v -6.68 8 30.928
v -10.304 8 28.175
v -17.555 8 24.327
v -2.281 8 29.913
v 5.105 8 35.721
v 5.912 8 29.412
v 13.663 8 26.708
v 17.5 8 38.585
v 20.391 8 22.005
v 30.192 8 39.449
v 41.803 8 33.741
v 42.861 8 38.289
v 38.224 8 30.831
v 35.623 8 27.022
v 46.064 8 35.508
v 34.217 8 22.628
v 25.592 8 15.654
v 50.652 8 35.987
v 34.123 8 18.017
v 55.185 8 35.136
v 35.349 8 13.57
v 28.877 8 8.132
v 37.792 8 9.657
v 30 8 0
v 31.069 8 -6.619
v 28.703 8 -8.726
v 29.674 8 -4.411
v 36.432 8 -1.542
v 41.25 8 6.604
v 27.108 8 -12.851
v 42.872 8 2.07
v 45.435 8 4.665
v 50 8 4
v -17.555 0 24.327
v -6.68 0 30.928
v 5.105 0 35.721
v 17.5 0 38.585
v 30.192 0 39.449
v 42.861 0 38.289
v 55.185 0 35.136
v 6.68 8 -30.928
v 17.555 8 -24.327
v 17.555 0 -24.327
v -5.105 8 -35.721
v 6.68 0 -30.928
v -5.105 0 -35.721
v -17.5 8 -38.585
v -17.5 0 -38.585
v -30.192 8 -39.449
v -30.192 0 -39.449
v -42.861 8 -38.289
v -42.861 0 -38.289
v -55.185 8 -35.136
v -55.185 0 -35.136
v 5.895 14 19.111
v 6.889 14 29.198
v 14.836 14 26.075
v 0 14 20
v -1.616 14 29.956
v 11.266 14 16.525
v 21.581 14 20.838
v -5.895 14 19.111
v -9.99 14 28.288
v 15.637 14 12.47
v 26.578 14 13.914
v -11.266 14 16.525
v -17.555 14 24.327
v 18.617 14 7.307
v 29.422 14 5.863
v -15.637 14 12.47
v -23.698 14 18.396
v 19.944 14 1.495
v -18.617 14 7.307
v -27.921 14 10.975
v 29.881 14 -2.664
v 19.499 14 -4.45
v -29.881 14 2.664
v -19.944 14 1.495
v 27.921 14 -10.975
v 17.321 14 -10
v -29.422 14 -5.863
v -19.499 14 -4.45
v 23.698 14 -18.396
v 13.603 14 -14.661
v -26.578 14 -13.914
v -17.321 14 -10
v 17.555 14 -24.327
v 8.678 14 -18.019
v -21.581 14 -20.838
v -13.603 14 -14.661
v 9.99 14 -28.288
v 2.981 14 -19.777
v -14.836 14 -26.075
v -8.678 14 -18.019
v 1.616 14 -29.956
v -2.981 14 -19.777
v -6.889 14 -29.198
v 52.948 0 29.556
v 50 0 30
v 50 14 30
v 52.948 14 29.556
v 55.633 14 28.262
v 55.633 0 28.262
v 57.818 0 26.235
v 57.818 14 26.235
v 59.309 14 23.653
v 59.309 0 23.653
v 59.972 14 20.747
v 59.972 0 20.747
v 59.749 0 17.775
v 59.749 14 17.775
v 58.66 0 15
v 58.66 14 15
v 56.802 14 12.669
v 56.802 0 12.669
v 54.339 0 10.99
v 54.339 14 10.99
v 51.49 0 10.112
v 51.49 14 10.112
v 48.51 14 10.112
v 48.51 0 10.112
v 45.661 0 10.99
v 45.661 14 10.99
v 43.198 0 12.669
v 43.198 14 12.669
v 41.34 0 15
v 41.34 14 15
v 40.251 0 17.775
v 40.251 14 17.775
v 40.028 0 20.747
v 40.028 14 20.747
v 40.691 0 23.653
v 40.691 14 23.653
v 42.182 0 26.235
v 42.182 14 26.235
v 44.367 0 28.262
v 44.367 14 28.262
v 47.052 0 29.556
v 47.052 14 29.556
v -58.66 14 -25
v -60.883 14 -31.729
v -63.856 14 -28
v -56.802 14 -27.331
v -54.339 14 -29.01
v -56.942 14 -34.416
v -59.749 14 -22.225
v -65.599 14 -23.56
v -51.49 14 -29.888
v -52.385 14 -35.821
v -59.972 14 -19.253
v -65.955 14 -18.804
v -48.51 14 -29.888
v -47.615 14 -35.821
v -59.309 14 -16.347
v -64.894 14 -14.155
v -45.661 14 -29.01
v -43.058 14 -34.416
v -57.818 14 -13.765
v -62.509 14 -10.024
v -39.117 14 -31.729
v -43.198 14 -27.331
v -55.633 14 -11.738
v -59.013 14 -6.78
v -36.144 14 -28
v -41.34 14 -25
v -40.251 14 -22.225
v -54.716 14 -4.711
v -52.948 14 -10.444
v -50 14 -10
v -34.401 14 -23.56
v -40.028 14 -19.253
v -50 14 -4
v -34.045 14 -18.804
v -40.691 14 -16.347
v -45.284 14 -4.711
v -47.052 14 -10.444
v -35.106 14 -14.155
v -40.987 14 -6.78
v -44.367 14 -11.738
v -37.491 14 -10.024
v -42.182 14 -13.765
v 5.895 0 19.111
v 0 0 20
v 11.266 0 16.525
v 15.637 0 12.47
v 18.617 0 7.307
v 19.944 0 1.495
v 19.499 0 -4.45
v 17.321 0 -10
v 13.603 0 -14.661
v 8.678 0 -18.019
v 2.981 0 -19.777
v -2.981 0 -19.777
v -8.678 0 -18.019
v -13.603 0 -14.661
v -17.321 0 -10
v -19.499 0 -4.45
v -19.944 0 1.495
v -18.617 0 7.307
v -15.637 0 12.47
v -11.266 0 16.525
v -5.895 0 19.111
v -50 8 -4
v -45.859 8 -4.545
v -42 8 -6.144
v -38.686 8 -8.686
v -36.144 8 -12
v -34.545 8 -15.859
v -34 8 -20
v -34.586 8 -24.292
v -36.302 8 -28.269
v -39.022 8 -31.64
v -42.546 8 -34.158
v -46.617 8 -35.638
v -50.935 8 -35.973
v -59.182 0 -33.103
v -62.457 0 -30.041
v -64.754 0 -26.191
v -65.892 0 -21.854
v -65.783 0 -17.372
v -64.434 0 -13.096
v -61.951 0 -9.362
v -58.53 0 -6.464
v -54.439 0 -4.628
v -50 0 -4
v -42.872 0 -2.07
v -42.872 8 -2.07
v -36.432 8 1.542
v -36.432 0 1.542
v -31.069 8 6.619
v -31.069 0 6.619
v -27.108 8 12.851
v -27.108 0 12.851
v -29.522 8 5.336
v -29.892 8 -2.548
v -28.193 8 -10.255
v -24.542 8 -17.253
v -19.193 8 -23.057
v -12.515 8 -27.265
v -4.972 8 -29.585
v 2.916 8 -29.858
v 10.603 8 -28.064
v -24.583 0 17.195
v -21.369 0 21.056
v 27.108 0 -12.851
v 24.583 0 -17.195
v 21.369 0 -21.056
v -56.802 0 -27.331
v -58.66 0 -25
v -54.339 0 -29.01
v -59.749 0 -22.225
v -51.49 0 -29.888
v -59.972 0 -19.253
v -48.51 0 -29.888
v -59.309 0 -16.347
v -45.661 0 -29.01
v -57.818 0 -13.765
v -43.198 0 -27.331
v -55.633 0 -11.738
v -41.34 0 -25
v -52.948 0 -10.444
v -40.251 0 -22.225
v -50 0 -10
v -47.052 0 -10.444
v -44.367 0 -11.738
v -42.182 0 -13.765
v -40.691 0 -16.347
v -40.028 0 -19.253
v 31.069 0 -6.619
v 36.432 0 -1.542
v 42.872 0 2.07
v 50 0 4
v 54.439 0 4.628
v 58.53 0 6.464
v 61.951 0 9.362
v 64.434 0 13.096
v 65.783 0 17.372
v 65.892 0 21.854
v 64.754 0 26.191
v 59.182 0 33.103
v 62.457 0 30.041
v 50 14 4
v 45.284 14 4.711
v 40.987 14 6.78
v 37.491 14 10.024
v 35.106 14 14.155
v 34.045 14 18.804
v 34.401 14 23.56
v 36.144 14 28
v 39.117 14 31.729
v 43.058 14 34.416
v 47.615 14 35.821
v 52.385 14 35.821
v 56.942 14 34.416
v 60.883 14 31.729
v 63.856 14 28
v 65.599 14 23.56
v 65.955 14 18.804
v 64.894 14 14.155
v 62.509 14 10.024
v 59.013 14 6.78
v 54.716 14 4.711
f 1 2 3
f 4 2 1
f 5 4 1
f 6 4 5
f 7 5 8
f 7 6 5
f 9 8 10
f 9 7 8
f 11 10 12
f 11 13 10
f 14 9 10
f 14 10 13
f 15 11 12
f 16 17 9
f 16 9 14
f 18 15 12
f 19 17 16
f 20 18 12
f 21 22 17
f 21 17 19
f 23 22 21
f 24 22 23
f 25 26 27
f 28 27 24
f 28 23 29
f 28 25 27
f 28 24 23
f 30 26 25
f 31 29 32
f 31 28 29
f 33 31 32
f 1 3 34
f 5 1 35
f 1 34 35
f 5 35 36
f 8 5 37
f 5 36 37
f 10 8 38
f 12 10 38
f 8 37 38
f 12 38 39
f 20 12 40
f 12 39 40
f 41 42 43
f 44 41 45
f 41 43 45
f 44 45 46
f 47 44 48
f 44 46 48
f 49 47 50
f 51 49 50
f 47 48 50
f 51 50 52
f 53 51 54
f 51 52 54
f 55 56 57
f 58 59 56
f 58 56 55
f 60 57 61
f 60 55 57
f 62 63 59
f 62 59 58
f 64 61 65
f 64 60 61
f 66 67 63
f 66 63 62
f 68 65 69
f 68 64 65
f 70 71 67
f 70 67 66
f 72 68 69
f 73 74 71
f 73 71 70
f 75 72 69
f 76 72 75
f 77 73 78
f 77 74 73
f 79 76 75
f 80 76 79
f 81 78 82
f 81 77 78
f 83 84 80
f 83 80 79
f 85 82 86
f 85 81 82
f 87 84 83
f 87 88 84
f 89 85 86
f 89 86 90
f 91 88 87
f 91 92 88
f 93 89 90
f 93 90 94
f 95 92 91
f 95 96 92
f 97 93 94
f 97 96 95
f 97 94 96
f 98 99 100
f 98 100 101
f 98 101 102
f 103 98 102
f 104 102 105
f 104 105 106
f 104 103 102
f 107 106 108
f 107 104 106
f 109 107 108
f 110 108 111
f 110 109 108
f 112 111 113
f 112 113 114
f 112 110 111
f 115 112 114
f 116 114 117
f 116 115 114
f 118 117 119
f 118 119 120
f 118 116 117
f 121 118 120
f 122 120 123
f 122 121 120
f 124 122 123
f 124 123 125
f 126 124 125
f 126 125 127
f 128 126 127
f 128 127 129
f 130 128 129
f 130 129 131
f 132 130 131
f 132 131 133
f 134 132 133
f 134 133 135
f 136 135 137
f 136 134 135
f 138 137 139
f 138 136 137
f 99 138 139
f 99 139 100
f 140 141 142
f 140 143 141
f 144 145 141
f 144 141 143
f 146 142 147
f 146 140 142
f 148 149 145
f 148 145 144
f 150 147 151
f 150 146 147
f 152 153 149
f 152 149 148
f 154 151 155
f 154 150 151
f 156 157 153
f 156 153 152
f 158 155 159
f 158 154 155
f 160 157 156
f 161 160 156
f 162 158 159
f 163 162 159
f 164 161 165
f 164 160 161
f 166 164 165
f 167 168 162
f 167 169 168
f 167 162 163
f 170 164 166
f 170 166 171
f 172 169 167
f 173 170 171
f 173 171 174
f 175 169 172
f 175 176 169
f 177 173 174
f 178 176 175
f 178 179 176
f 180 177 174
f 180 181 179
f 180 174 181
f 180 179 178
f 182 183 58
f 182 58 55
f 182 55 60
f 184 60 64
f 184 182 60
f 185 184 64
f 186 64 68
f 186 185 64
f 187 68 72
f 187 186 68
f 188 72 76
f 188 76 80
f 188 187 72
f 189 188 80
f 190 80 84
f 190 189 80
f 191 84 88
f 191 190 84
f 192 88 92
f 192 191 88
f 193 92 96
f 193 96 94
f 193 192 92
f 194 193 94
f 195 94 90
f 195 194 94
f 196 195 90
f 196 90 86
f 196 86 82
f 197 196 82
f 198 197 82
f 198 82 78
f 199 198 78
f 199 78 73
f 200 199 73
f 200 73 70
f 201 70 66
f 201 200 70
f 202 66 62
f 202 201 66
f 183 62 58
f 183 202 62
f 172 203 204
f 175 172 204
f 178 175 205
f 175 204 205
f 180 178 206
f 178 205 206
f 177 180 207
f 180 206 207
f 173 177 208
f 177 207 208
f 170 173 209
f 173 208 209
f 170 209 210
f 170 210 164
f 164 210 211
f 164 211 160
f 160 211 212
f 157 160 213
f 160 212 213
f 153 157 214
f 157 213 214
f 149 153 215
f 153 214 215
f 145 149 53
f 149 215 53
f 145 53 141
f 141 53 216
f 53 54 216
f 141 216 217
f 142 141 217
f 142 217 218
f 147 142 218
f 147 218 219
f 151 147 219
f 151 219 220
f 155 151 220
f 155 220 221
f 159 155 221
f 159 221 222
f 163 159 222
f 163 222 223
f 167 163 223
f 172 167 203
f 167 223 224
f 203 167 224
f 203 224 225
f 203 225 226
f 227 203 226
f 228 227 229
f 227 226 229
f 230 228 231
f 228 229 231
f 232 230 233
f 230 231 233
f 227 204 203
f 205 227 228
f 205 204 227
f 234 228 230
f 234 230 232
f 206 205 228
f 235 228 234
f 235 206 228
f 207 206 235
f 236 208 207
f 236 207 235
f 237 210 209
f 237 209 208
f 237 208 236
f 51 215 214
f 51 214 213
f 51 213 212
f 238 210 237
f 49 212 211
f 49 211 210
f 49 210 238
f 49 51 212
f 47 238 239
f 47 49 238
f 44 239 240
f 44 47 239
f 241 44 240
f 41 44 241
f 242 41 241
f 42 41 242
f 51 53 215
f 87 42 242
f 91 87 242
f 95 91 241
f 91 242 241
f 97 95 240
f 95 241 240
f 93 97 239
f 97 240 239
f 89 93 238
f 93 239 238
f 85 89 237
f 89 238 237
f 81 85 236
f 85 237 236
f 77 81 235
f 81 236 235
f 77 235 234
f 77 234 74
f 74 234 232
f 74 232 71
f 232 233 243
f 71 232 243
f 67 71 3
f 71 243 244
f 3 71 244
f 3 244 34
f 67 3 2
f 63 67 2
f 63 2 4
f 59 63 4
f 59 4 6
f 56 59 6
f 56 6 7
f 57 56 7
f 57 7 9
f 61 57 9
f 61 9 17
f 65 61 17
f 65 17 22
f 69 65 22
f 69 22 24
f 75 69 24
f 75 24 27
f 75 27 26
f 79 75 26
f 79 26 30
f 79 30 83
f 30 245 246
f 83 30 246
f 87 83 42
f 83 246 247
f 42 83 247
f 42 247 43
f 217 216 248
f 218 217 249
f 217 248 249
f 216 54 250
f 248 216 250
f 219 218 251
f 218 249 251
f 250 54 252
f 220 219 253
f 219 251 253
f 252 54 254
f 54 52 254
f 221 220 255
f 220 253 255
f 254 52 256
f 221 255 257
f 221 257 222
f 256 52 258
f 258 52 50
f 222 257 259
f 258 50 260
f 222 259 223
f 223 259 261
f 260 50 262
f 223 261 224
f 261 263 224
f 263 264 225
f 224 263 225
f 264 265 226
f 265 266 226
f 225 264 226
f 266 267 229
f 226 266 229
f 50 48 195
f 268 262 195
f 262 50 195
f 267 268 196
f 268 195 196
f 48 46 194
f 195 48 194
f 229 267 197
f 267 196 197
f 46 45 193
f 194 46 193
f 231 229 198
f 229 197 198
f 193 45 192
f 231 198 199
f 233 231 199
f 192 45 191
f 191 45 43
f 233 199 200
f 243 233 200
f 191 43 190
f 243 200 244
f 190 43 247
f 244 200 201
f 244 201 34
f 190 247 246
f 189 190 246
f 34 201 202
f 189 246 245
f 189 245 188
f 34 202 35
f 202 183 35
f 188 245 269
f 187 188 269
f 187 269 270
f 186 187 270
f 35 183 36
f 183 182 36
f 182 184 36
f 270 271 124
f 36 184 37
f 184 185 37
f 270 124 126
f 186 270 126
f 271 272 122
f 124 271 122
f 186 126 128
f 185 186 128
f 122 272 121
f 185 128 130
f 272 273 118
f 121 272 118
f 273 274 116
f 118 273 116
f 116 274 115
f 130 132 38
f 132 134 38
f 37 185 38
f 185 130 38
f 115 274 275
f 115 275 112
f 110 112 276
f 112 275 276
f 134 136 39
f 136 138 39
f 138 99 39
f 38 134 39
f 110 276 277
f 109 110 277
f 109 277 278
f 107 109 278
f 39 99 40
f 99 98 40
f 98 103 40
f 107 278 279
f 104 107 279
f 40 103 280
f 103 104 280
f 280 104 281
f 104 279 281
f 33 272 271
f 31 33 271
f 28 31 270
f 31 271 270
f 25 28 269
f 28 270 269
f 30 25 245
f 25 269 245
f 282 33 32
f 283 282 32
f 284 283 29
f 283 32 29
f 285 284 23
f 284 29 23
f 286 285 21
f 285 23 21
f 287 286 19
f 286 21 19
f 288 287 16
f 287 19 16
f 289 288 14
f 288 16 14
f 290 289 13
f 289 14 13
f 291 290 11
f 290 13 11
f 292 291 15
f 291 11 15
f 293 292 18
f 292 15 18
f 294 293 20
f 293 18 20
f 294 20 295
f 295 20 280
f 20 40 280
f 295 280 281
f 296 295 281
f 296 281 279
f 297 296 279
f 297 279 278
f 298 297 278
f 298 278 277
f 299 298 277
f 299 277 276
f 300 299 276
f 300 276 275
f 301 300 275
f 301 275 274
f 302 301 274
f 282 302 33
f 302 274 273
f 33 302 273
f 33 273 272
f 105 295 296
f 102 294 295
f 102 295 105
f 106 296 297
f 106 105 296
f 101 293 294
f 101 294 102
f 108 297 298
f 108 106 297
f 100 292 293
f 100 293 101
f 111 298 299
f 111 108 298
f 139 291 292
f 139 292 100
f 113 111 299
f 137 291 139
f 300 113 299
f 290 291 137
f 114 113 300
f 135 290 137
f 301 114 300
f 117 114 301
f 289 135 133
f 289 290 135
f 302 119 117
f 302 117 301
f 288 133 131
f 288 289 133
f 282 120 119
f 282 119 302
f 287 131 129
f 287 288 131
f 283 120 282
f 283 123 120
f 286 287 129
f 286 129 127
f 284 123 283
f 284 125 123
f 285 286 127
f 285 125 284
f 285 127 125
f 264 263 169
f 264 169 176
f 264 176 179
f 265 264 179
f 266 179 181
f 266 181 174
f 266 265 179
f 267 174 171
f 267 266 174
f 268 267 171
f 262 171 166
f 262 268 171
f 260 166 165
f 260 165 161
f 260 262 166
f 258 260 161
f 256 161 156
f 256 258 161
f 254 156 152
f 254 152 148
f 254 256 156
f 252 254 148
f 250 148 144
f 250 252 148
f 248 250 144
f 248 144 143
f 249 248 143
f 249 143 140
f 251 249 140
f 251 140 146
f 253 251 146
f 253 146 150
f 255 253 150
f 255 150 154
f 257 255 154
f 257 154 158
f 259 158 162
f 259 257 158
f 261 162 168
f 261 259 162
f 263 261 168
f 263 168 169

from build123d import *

# Parameters (mm, degrees)
ESTRUSIONE_ESTRUSIONE1_DEPTH   = 8
ESTRUSIONE_ESTRUSIONE1_2_DEPTH = 8
SCHIZZO1_8_R                   = 30
SCHIZZO1_8_R_2                 = 20
SCHIZZO1_8_R_3                 = 16
SCHIZZO1_8_R_4                 = 10
ESTRUSIONE_ESTRUSIONE2_DEPTH   = 14


with BuildPart() as part:
    # Schizzo1 → Estrusione-Estrusione1 (new body)
    with BuildSketch(Plane(origin=(0, 0, 0), x_dir=(1, 0, 0), z_dir=(0, 1, 0))):
        with BuildLine():
            ThreePointArc((27.108090114, 12.851126424), (19.193137928, -23.056961129), (-17.554966307, -24.327415768))
            ThreePointArc((-17.554966307, -24.327415768), (17.499627211, -38.585427044), (55.185430705, -35.136423237))
            ThreePointArc((55.185430705, -35.136423237), (34.217370755, -22.628424263), (50, -4))
            ThreePointArc((50, -4), (36.431563461, 1.542215464), (27.108090114, 12.851126424))
        make_face()
    extrude(amount=ESTRUSIONE_ESTRUSIONE1_DEPTH)



with BuildPart() as body_2:
    # Schizzo1 → Estrusione-Estrusione1 2 (new body)
    with BuildSketch(Plane(origin=(0, 0, 0), x_dir=(1, 0, 0), z_dir=(0, 1, 0))):
        with BuildLine():
            ThreePointArc((-27.108090114, -12.851126424), (-19.193137928, 23.056961129), (17.554966307, 24.327415768))
            ThreePointArc((17.554966307, 24.327415768), (-17.499627211, 38.585427044), (-55.185430705, 35.136423237))
            ThreePointArc((-55.185430705, 35.136423237), (-34.217370755, 22.628424263), (-50, 4))
            ThreePointArc((-50, 4), (-36.431563461, -1.542215464), (-27.108090114, -12.851126424))
        make_face()
    extrude(amount=ESTRUSIONE_ESTRUSIONE1_2_DEPTH)


with BuildPart() as part_1:
    add(part.part)

    add(body_2.part)  # Estrusione-Estrusione2 merges body 2
    # Schizzo1<8> → Estrusione-Estrusione2 (add)
    # profile 1 of 3: a face of its own
    with BuildSketch(Plane(origin=(0, 0, 0), x_dir=(1, 0, 0), z_dir=(0, 1, 0))):
        Circle(SCHIZZO1_8_R)
        Circle(SCHIZZO1_8_R_2, mode=Mode.SUBTRACT)
    # profile 2 of 3: a face of its own
    with BuildSketch(Plane(origin=(0, 0, 0), x_dir=(1, 0, 0), z_dir=(0, 1, 0))):
        with Locations((50, -20)):
            Circle(SCHIZZO1_8_R_3)
        with Locations((50, -20)):
            Circle(SCHIZZO1_8_R_4, mode=Mode.SUBTRACT)
    # profile 3 of 3: a face of its own
    with BuildSketch(Plane(origin=(0, 0, 0), x_dir=(1, 0, 0), z_dir=(0, 1, 0))):
        with Locations((-50, 20)):
            Circle(SCHIZZO1_8_R_3)
        with Locations((-50, 20)):
            Circle(SCHIZZO1_8_R_4, mode=Mode.SUBTRACT)
    extrude(amount=ESTRUSIONE_ESTRUSIONE2_DEPTH)


solid = part_1.part
